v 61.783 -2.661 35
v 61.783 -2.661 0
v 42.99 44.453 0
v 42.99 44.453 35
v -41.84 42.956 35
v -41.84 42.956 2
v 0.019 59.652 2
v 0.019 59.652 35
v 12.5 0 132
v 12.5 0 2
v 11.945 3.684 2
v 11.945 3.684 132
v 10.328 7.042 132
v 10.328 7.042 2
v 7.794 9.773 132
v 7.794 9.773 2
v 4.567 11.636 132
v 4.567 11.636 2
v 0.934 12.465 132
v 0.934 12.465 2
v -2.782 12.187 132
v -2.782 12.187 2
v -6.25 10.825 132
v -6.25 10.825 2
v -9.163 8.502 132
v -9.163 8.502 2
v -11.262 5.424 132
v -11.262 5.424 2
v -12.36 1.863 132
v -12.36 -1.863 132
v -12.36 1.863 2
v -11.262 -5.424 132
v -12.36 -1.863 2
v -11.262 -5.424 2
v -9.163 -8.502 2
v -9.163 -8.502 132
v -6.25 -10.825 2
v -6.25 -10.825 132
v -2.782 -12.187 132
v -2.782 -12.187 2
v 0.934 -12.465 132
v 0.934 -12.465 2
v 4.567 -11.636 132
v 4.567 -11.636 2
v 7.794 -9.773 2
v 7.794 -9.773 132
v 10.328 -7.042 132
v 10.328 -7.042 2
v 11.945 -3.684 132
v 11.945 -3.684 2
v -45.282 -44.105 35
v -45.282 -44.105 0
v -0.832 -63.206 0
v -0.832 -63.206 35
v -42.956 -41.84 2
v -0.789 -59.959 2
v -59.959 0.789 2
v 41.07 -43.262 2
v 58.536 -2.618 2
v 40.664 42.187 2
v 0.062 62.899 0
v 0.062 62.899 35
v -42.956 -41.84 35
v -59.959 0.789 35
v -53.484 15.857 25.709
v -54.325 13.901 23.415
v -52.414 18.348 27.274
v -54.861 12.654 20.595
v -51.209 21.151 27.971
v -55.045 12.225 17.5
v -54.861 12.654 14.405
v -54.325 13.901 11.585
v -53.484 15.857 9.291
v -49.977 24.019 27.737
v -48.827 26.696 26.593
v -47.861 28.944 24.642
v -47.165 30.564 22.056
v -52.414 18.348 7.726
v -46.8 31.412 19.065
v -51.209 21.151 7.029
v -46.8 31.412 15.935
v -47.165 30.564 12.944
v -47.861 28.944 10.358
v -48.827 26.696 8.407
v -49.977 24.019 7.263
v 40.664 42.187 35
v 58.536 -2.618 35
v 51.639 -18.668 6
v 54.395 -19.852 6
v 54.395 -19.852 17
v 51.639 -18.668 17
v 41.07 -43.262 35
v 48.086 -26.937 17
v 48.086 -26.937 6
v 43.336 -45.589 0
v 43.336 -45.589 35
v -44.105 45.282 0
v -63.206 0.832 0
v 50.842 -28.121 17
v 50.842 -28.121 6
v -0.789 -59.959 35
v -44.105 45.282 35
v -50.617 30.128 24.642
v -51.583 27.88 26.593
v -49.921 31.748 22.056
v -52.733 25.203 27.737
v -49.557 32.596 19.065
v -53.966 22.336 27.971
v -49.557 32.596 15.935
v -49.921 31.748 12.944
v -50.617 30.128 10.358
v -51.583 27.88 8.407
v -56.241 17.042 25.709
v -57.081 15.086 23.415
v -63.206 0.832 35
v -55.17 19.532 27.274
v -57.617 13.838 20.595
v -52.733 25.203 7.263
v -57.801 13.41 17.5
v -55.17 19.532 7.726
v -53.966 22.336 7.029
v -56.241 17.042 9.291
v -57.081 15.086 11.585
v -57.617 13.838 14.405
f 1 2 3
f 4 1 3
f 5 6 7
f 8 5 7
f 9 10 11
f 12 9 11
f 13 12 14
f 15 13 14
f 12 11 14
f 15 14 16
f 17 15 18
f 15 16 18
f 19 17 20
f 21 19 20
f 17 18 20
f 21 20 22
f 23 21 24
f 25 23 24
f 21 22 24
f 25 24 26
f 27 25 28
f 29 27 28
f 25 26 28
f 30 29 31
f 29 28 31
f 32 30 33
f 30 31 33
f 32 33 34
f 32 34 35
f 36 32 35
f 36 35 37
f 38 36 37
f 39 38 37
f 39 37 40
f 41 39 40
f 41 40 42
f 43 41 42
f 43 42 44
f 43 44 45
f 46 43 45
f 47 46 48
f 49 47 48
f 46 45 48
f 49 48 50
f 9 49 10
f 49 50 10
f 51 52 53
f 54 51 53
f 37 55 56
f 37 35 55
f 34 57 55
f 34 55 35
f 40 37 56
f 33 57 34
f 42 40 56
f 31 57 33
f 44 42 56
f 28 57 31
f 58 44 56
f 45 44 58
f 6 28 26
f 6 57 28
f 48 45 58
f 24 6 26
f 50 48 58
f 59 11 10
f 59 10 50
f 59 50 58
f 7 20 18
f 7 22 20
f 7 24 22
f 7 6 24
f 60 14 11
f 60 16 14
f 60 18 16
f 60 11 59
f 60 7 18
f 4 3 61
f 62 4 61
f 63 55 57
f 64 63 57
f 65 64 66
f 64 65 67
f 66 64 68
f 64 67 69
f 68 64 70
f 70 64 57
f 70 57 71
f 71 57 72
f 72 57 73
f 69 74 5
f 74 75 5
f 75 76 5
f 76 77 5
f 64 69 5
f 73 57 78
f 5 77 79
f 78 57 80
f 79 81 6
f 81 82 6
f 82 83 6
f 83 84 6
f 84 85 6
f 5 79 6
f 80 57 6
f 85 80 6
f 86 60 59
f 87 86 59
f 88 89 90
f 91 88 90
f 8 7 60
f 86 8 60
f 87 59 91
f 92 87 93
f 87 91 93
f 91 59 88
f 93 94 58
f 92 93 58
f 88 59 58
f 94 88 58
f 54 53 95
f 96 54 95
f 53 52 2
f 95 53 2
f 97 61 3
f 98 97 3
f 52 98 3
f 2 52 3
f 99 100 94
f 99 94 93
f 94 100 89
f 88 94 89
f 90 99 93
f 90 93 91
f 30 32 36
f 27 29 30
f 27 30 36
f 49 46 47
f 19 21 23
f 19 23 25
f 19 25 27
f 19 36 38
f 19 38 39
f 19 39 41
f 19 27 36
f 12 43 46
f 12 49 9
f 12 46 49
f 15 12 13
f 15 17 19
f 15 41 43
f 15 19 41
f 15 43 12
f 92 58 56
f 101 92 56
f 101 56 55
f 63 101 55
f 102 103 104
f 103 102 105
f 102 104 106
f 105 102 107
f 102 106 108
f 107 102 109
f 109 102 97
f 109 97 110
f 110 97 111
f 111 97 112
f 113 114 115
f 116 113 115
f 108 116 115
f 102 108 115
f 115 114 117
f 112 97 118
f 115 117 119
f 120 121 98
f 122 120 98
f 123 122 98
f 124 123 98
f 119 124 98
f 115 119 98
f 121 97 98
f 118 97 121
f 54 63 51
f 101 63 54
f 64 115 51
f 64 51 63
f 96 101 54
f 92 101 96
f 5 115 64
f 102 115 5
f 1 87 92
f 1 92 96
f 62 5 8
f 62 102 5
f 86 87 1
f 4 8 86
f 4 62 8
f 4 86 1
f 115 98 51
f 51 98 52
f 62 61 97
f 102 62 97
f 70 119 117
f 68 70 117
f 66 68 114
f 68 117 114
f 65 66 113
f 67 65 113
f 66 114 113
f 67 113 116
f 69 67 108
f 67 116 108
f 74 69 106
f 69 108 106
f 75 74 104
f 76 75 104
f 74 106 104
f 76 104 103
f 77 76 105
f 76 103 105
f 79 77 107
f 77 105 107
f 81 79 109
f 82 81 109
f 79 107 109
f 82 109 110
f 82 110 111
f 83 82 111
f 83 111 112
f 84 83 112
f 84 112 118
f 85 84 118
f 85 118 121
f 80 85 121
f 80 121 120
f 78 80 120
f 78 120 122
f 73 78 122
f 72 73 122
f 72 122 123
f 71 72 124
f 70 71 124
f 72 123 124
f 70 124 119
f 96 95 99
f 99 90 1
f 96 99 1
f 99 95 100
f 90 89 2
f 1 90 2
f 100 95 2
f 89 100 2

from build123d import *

# Parameters (mm, degrees)
F1_DEPTH = 35
F2_DEPTH = 2
F3_W     = 9
F3_H     = 11
F4_DEPTH = 3
F5_R     = 12.5
F6_DEPTH = 130
F7_R     = 10.5
F8_DEPTH = 3


with BuildPart() as f1:
    # F0 (on Top) → F1 (new body)
    with BuildSketch(Plane.XY):
        Polygon((0.0621920733, 62.8993051266), (-44.1054810761, 45.2816312037), (-63.2062332438, 0.831663731), (-45.2816312037, -44.1054810761), (-0.831663731, -63.2062332438), (43.3360094184, -45.5885593209), (61.7826262379, -2.6608510081), (42.9899003861, 44.4526883072), align=None)
        Polygon((-42.9555200118, -41.8397885551), (-59.9593377004, 0.788941279), (-41.8397885551, 42.9555200118), (0.0194696214, 59.6524095833), (40.6637891941, 42.1869957861), (58.5357306946, -2.6181285562), (41.0703168974, -43.2624481289), (-0.788941279, -59.9593377004), align=None, mode=Mode.SUBTRACT)
    extrude(amount=F1_DEPTH)

    # F0 (on Top) → F2 (join)
    with BuildSketch(Plane.XY):
        Polygon((-41.8397885551, 42.9555200118), (-59.9593377004, 0.788941279), (-42.9555200118, -41.8397885551), (-0.788941279, -59.9593377004), (41.0703168974, -43.2624481289), (58.5357306946, -2.6181285562), (40.6637891941, 42.1869957861), (0.0194696214, 59.6524095833), align=None)
    extrude(amount=F2_DEPTH)

    # F3 (on face) → F4 (cut, through all)
    with BuildSketch(Plane(origin=(53.1176572725, -22.8253756971, 0), x_dir=(0.3948056073, 0.9187646774, 0), z_dir=(0.9187646774, -0.3948056073, 0))):
        with Locations((-1.2642135624, 11.5)):
            Rectangle(F3_W, F3_H)
    extrude(amount=-F4_DEPTH, mode=Mode.SUBTRACT)

    # F5 (on face) → F6 (join)
    with BuildSketch(Plane.XY.offset(2)):
        Circle(F5_R)
    extrude(amount=F6_DEPTH)

    # F7 (on face) → F8 (cut, through all)
    with BuildSketch(Plane(origin=(-53.6558571599, 23.0566474674, 0), x_dir=(-0.3948056073, -0.9187646774, 0), z_dir=(-0.9187646774, 0.3948056073, 0))):
        with Locations((0, 17.5)):
            Circle(F7_R)
    extrude(amount=-F8_DEPTH, mode=Mode.SUBTRACT)


solid = f1.part
